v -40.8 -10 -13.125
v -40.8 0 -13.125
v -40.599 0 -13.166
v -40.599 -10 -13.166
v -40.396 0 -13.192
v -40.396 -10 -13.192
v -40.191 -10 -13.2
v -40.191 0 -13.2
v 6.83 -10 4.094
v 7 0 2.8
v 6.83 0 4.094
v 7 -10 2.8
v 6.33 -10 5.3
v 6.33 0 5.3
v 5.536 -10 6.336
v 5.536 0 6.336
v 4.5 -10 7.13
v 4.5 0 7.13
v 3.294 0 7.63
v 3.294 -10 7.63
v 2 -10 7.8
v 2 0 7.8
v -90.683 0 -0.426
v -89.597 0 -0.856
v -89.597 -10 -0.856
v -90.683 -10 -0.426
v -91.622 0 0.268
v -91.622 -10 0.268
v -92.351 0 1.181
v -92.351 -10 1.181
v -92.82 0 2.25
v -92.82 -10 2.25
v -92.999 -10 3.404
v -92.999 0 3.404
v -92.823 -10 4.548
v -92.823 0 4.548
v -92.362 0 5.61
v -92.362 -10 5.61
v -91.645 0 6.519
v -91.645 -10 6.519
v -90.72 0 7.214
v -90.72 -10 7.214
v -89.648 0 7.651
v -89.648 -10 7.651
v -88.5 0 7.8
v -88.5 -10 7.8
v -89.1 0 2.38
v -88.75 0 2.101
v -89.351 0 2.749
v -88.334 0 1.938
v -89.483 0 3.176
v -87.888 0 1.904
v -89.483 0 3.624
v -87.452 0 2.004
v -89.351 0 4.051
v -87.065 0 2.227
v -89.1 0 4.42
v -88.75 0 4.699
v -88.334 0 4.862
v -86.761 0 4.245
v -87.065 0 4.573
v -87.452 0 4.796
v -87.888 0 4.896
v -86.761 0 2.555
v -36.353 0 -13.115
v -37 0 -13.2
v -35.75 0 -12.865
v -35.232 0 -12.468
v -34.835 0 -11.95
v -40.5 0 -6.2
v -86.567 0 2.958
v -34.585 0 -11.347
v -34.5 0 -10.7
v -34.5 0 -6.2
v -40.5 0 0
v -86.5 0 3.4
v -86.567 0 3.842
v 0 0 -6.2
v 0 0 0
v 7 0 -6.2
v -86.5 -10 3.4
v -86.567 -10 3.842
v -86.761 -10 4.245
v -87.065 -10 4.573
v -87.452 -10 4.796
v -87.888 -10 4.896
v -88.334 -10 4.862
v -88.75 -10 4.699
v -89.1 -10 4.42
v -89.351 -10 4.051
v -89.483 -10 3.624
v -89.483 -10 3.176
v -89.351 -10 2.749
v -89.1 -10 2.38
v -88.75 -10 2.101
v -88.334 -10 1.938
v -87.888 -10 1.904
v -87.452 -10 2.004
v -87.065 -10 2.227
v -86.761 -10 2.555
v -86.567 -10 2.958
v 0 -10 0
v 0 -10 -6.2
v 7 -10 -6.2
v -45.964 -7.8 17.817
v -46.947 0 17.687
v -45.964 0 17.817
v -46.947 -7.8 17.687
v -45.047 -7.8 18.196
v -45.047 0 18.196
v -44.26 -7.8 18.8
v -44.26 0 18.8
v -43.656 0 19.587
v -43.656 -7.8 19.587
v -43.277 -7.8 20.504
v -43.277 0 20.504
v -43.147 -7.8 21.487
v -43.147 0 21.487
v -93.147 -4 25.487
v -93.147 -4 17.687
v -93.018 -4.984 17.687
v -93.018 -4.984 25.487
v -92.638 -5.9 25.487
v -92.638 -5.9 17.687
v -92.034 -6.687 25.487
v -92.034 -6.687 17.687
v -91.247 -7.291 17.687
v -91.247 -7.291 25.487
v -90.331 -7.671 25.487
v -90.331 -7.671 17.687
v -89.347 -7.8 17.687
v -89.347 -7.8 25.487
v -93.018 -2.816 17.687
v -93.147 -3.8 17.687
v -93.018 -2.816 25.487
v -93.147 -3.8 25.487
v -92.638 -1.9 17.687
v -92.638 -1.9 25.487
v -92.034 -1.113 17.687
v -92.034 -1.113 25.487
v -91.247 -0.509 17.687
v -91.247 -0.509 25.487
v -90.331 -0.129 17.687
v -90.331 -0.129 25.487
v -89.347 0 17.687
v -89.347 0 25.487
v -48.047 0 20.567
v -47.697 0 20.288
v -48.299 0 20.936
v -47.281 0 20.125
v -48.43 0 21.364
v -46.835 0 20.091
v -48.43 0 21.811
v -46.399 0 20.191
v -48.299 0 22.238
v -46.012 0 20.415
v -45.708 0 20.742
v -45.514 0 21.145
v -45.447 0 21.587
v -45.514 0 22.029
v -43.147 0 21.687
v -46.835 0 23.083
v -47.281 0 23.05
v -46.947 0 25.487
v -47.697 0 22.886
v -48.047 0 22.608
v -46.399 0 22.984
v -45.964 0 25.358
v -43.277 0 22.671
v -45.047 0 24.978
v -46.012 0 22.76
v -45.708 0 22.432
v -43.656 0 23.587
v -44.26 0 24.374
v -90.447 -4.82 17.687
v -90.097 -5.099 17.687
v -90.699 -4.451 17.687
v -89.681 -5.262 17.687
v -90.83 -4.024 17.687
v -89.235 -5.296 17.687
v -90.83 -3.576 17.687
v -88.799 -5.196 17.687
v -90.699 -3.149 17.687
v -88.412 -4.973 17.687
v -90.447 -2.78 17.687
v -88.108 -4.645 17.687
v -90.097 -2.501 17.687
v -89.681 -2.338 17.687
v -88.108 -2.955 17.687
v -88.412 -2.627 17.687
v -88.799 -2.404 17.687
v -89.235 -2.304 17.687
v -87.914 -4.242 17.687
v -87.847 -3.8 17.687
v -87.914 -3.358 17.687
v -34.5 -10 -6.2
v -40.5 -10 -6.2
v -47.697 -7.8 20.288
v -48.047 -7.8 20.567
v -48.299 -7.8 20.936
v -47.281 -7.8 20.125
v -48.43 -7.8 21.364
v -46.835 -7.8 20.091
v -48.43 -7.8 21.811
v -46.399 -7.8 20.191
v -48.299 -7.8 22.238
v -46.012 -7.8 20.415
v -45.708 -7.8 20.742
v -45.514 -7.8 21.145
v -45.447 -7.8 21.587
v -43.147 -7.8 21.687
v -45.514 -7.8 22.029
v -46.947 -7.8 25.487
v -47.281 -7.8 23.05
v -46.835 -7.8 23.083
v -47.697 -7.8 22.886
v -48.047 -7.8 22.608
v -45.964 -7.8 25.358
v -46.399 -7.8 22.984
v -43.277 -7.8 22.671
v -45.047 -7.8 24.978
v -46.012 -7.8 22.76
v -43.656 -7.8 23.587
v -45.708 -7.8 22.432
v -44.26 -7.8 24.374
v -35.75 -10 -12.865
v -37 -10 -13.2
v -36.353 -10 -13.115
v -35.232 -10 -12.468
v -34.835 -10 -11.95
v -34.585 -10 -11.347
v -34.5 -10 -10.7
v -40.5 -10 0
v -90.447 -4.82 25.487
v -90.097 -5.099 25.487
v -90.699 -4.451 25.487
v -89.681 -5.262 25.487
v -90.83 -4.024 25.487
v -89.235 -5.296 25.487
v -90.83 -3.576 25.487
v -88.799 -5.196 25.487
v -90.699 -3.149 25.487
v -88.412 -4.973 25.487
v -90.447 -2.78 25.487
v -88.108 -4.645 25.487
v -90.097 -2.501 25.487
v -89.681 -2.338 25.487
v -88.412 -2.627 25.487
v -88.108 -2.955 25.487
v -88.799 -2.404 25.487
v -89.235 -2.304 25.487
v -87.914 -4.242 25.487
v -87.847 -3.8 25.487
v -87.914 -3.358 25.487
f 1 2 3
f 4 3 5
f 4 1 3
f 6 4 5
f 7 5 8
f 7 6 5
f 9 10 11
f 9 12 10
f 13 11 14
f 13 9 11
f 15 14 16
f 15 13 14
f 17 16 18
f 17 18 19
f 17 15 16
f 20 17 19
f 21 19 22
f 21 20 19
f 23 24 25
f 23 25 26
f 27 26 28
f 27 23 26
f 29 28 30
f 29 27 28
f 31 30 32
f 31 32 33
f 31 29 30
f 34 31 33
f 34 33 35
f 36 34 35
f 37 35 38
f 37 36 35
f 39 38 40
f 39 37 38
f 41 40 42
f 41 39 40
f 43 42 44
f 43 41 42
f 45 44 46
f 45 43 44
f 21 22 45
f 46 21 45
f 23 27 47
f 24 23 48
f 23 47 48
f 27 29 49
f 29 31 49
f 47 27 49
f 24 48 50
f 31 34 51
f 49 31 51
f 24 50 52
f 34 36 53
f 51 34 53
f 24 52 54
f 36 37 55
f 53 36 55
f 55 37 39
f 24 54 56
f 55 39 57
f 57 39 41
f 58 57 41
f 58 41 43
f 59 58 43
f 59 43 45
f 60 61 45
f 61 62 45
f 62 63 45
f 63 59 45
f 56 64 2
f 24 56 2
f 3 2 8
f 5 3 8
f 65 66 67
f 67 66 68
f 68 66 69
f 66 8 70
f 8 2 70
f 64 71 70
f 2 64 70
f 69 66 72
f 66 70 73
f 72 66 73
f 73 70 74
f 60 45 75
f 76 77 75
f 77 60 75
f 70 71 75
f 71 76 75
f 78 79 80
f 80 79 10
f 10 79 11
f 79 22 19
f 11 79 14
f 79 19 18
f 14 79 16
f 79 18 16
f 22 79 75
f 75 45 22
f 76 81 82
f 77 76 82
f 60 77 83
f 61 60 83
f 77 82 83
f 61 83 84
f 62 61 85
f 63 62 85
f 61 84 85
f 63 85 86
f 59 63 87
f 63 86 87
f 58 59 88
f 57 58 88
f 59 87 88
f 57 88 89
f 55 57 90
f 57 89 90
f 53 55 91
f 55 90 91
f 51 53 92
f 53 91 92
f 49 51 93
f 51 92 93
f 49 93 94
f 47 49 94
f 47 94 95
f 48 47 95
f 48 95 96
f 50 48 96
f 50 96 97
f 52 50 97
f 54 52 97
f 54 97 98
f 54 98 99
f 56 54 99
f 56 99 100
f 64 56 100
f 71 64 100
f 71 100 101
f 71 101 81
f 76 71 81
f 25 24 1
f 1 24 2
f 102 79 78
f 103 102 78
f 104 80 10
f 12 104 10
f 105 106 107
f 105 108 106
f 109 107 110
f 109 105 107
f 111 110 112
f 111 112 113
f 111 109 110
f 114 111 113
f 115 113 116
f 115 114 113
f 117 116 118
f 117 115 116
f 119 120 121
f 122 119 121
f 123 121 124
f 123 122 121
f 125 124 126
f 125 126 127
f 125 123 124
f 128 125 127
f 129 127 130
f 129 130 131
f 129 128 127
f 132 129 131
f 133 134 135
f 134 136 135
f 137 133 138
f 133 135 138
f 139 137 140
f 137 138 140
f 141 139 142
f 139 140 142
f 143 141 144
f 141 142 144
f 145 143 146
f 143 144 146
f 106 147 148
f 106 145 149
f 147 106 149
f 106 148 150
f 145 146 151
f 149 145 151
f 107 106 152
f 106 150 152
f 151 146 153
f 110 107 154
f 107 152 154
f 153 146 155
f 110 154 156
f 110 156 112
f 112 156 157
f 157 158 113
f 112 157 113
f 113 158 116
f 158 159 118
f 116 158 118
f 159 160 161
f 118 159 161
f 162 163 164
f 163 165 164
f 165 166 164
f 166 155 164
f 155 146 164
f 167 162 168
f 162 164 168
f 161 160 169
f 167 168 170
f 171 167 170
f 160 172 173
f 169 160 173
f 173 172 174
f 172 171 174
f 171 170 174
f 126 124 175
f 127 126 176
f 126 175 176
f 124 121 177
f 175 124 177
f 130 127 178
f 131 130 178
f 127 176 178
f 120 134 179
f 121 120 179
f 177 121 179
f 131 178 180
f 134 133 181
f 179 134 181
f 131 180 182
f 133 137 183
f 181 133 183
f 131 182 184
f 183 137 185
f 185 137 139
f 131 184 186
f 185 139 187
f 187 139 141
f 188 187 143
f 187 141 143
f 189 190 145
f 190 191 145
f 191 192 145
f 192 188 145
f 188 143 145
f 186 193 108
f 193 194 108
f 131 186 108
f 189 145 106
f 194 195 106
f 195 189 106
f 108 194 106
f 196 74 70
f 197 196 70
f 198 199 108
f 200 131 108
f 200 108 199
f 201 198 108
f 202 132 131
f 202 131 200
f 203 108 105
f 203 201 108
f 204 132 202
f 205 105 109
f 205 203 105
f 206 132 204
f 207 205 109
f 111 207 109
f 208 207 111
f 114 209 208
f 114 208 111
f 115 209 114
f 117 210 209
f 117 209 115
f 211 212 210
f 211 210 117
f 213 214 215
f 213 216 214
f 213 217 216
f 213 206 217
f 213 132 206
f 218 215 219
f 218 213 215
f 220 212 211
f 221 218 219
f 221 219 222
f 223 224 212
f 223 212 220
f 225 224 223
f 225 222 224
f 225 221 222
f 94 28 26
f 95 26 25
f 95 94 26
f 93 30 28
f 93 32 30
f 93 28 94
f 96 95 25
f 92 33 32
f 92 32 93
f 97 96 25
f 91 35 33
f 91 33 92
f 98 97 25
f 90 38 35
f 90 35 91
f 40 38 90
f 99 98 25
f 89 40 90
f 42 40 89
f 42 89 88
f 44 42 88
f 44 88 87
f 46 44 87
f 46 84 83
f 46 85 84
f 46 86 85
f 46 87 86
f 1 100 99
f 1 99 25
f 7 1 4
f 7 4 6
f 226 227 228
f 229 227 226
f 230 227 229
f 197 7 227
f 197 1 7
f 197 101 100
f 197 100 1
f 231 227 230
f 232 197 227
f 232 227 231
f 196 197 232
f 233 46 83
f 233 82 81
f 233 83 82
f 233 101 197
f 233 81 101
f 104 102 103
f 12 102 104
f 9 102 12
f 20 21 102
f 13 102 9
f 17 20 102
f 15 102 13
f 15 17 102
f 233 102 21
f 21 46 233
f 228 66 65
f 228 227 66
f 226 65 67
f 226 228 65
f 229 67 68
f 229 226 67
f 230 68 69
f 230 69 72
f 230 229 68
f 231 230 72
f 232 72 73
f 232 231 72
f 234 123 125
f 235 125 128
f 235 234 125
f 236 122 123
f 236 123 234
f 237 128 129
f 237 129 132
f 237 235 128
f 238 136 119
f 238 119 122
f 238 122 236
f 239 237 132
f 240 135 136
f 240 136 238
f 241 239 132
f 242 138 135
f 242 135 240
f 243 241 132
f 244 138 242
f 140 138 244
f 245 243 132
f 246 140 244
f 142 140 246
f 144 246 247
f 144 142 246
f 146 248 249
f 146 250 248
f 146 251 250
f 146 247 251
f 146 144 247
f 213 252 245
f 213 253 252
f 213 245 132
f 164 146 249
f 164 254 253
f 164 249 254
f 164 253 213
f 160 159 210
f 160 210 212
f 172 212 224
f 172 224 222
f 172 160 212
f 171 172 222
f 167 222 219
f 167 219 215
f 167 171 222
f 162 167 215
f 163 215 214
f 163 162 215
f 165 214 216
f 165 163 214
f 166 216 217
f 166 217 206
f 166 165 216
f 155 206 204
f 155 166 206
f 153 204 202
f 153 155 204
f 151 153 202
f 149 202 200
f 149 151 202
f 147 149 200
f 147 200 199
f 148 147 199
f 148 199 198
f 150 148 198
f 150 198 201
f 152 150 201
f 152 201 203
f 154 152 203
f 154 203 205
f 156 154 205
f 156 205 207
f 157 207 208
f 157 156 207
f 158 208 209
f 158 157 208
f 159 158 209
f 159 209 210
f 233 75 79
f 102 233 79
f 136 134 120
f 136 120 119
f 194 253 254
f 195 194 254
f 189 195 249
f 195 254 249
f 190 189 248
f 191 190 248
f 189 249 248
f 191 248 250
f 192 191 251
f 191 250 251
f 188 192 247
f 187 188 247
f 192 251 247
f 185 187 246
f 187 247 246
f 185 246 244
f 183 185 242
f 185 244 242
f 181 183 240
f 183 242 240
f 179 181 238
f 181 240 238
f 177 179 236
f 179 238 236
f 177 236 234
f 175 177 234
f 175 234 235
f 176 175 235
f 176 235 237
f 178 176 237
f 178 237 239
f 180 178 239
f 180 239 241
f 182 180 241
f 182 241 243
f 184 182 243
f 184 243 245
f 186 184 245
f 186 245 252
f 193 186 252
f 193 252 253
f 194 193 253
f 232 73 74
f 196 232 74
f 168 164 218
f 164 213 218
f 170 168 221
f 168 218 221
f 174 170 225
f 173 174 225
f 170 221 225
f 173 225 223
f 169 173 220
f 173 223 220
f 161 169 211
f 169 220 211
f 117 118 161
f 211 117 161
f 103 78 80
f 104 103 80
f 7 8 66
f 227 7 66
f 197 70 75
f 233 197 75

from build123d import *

# Parameters (mm, degrees)
F1_DEPTH    = 10
F2_R        = 5
F3_R        = 2.5
F4_T1_DEPTH = 27.5431430313
F4_T3_DEPTH = 32.5
F5_R        = 1.5
F6_DEPTH    = 25
F7_W        = 50
F7_H        = 7.8
F7_R        = 1.5
F8_DEPTH    = 7.8
F9_R        = 3.8
F10_R       = 1.5
F11_DEPTH   = 25


# Not quite as in the source:
# - a fillet or chamfer that OpenCascade refuses, or shapes differently, is made with other operations: its cross-section is extruded or revolved along the edge and cut away or added


with BuildPart() as f1:
    # F0 (on Front) → F1 (new body)
    with BuildSketch(Plane.XZ):
        Polygon((-40.5, 0), (0, 0), (0, -6.2), (7, -6.2), (7, 7.8), (-93, 7.8), (-93, 0), (-40.5, -13.2), (-34.5, -13.2), (-34.5, -6.2), (-40.5, -6.2), align=None)
    extrude(amount=F1_DEPTH)

    # F2
    f2_edges = [f1.edges().sort_by_distance(p)[0] for p in [
        (7, -5, 7.8),
    ]]
    fillet(f2_edges, radius=F2_R)

    # F3
    f3_edges = [f1.edges().sort_by_distance(p)[0] for p in [
        (-34.5, -5, -13.2),
        (-40.5, -5, -13.2),
    ]]
    fillet(f3_edges, radius=F3_R)

    # F4: fillet of radius 4.5 on 2 edges, made by hand

    # F4_s2 → F4_t1 (cut)
    with BuildSketch(Plane.XZ.offset(-8.7715715157)):
        with BuildLine():
            ThreePointArc((-89.5972771189, -0.855541753), (-92.0487847945, 0.7416579735), (-93, 3.5086286063))
            Line((-93, 3.5086286063), (-93, 0))
            Line((-93, 0), (-89.5972771189, -0.855541753))
        make_face()
    extrude(amount=F4_T1_DEPTH, mode=Mode.SUBTRACT)

    # F4_s4 → F4_t3 (cut)
    with BuildSketch(Plane.XZ.offset(-11.25)):
        with BuildLine():
            ThreePointArc((-93, 3.3), (-91.6819805153, 6.4819805153), (-88.5, 7.8))
            Line((-88.5, 7.8), (-93, 7.8))
            Line((-93, 7.8), (-93, 3.3))
        make_face()
    extrude(amount=F4_T3_DEPTH, mode=Mode.SUBTRACT)

    # F5 (on face) → F6 (cut)
    with BuildSketch(Plane.XZ.offset(10)):
        with Locations((-88, 3.4)):
            Circle(F5_R)
    extrude(amount=-F6_DEPTH, mode=Mode.SUBTRACT)


with BuildPart() as f8:
    # F7 (on Front) → F8 (new body)
    with BuildSketch(Plane.XZ):
        with Locations((-68.1472382043, 21.5872781662)):
            Rectangle(F7_W, F7_H)
        with Locations((-46.9472382043, 21.5872781662)):
            Circle(F7_R, mode=Mode.SUBTRACT)
    extrude(amount=F8_DEPTH)

    # F9
    f9_edges = [f8.edges().sort_by_distance(p)[0] for p in [
        (-43.147238, -3.9, 25.487278),
        (-43.147238, -3.9, 17.687278),
        (-93.147238, -7.8, 21.587278),
        (-93.147238, 0, 21.587278),
    ]]
    fillet(f9_edges, radius=F9_R)

    # F10 (on face) → F11 (cut)
    with BuildSketch(Plane.XY.offset(25.4872781662)):
        with Locations((-89.3472382043, -3.8)):
            Circle(F10_R)
    extrude(amount=-F11_DEPTH, mode=Mode.SUBTRACT)


solid = Compound([f1.part, f8.part])
